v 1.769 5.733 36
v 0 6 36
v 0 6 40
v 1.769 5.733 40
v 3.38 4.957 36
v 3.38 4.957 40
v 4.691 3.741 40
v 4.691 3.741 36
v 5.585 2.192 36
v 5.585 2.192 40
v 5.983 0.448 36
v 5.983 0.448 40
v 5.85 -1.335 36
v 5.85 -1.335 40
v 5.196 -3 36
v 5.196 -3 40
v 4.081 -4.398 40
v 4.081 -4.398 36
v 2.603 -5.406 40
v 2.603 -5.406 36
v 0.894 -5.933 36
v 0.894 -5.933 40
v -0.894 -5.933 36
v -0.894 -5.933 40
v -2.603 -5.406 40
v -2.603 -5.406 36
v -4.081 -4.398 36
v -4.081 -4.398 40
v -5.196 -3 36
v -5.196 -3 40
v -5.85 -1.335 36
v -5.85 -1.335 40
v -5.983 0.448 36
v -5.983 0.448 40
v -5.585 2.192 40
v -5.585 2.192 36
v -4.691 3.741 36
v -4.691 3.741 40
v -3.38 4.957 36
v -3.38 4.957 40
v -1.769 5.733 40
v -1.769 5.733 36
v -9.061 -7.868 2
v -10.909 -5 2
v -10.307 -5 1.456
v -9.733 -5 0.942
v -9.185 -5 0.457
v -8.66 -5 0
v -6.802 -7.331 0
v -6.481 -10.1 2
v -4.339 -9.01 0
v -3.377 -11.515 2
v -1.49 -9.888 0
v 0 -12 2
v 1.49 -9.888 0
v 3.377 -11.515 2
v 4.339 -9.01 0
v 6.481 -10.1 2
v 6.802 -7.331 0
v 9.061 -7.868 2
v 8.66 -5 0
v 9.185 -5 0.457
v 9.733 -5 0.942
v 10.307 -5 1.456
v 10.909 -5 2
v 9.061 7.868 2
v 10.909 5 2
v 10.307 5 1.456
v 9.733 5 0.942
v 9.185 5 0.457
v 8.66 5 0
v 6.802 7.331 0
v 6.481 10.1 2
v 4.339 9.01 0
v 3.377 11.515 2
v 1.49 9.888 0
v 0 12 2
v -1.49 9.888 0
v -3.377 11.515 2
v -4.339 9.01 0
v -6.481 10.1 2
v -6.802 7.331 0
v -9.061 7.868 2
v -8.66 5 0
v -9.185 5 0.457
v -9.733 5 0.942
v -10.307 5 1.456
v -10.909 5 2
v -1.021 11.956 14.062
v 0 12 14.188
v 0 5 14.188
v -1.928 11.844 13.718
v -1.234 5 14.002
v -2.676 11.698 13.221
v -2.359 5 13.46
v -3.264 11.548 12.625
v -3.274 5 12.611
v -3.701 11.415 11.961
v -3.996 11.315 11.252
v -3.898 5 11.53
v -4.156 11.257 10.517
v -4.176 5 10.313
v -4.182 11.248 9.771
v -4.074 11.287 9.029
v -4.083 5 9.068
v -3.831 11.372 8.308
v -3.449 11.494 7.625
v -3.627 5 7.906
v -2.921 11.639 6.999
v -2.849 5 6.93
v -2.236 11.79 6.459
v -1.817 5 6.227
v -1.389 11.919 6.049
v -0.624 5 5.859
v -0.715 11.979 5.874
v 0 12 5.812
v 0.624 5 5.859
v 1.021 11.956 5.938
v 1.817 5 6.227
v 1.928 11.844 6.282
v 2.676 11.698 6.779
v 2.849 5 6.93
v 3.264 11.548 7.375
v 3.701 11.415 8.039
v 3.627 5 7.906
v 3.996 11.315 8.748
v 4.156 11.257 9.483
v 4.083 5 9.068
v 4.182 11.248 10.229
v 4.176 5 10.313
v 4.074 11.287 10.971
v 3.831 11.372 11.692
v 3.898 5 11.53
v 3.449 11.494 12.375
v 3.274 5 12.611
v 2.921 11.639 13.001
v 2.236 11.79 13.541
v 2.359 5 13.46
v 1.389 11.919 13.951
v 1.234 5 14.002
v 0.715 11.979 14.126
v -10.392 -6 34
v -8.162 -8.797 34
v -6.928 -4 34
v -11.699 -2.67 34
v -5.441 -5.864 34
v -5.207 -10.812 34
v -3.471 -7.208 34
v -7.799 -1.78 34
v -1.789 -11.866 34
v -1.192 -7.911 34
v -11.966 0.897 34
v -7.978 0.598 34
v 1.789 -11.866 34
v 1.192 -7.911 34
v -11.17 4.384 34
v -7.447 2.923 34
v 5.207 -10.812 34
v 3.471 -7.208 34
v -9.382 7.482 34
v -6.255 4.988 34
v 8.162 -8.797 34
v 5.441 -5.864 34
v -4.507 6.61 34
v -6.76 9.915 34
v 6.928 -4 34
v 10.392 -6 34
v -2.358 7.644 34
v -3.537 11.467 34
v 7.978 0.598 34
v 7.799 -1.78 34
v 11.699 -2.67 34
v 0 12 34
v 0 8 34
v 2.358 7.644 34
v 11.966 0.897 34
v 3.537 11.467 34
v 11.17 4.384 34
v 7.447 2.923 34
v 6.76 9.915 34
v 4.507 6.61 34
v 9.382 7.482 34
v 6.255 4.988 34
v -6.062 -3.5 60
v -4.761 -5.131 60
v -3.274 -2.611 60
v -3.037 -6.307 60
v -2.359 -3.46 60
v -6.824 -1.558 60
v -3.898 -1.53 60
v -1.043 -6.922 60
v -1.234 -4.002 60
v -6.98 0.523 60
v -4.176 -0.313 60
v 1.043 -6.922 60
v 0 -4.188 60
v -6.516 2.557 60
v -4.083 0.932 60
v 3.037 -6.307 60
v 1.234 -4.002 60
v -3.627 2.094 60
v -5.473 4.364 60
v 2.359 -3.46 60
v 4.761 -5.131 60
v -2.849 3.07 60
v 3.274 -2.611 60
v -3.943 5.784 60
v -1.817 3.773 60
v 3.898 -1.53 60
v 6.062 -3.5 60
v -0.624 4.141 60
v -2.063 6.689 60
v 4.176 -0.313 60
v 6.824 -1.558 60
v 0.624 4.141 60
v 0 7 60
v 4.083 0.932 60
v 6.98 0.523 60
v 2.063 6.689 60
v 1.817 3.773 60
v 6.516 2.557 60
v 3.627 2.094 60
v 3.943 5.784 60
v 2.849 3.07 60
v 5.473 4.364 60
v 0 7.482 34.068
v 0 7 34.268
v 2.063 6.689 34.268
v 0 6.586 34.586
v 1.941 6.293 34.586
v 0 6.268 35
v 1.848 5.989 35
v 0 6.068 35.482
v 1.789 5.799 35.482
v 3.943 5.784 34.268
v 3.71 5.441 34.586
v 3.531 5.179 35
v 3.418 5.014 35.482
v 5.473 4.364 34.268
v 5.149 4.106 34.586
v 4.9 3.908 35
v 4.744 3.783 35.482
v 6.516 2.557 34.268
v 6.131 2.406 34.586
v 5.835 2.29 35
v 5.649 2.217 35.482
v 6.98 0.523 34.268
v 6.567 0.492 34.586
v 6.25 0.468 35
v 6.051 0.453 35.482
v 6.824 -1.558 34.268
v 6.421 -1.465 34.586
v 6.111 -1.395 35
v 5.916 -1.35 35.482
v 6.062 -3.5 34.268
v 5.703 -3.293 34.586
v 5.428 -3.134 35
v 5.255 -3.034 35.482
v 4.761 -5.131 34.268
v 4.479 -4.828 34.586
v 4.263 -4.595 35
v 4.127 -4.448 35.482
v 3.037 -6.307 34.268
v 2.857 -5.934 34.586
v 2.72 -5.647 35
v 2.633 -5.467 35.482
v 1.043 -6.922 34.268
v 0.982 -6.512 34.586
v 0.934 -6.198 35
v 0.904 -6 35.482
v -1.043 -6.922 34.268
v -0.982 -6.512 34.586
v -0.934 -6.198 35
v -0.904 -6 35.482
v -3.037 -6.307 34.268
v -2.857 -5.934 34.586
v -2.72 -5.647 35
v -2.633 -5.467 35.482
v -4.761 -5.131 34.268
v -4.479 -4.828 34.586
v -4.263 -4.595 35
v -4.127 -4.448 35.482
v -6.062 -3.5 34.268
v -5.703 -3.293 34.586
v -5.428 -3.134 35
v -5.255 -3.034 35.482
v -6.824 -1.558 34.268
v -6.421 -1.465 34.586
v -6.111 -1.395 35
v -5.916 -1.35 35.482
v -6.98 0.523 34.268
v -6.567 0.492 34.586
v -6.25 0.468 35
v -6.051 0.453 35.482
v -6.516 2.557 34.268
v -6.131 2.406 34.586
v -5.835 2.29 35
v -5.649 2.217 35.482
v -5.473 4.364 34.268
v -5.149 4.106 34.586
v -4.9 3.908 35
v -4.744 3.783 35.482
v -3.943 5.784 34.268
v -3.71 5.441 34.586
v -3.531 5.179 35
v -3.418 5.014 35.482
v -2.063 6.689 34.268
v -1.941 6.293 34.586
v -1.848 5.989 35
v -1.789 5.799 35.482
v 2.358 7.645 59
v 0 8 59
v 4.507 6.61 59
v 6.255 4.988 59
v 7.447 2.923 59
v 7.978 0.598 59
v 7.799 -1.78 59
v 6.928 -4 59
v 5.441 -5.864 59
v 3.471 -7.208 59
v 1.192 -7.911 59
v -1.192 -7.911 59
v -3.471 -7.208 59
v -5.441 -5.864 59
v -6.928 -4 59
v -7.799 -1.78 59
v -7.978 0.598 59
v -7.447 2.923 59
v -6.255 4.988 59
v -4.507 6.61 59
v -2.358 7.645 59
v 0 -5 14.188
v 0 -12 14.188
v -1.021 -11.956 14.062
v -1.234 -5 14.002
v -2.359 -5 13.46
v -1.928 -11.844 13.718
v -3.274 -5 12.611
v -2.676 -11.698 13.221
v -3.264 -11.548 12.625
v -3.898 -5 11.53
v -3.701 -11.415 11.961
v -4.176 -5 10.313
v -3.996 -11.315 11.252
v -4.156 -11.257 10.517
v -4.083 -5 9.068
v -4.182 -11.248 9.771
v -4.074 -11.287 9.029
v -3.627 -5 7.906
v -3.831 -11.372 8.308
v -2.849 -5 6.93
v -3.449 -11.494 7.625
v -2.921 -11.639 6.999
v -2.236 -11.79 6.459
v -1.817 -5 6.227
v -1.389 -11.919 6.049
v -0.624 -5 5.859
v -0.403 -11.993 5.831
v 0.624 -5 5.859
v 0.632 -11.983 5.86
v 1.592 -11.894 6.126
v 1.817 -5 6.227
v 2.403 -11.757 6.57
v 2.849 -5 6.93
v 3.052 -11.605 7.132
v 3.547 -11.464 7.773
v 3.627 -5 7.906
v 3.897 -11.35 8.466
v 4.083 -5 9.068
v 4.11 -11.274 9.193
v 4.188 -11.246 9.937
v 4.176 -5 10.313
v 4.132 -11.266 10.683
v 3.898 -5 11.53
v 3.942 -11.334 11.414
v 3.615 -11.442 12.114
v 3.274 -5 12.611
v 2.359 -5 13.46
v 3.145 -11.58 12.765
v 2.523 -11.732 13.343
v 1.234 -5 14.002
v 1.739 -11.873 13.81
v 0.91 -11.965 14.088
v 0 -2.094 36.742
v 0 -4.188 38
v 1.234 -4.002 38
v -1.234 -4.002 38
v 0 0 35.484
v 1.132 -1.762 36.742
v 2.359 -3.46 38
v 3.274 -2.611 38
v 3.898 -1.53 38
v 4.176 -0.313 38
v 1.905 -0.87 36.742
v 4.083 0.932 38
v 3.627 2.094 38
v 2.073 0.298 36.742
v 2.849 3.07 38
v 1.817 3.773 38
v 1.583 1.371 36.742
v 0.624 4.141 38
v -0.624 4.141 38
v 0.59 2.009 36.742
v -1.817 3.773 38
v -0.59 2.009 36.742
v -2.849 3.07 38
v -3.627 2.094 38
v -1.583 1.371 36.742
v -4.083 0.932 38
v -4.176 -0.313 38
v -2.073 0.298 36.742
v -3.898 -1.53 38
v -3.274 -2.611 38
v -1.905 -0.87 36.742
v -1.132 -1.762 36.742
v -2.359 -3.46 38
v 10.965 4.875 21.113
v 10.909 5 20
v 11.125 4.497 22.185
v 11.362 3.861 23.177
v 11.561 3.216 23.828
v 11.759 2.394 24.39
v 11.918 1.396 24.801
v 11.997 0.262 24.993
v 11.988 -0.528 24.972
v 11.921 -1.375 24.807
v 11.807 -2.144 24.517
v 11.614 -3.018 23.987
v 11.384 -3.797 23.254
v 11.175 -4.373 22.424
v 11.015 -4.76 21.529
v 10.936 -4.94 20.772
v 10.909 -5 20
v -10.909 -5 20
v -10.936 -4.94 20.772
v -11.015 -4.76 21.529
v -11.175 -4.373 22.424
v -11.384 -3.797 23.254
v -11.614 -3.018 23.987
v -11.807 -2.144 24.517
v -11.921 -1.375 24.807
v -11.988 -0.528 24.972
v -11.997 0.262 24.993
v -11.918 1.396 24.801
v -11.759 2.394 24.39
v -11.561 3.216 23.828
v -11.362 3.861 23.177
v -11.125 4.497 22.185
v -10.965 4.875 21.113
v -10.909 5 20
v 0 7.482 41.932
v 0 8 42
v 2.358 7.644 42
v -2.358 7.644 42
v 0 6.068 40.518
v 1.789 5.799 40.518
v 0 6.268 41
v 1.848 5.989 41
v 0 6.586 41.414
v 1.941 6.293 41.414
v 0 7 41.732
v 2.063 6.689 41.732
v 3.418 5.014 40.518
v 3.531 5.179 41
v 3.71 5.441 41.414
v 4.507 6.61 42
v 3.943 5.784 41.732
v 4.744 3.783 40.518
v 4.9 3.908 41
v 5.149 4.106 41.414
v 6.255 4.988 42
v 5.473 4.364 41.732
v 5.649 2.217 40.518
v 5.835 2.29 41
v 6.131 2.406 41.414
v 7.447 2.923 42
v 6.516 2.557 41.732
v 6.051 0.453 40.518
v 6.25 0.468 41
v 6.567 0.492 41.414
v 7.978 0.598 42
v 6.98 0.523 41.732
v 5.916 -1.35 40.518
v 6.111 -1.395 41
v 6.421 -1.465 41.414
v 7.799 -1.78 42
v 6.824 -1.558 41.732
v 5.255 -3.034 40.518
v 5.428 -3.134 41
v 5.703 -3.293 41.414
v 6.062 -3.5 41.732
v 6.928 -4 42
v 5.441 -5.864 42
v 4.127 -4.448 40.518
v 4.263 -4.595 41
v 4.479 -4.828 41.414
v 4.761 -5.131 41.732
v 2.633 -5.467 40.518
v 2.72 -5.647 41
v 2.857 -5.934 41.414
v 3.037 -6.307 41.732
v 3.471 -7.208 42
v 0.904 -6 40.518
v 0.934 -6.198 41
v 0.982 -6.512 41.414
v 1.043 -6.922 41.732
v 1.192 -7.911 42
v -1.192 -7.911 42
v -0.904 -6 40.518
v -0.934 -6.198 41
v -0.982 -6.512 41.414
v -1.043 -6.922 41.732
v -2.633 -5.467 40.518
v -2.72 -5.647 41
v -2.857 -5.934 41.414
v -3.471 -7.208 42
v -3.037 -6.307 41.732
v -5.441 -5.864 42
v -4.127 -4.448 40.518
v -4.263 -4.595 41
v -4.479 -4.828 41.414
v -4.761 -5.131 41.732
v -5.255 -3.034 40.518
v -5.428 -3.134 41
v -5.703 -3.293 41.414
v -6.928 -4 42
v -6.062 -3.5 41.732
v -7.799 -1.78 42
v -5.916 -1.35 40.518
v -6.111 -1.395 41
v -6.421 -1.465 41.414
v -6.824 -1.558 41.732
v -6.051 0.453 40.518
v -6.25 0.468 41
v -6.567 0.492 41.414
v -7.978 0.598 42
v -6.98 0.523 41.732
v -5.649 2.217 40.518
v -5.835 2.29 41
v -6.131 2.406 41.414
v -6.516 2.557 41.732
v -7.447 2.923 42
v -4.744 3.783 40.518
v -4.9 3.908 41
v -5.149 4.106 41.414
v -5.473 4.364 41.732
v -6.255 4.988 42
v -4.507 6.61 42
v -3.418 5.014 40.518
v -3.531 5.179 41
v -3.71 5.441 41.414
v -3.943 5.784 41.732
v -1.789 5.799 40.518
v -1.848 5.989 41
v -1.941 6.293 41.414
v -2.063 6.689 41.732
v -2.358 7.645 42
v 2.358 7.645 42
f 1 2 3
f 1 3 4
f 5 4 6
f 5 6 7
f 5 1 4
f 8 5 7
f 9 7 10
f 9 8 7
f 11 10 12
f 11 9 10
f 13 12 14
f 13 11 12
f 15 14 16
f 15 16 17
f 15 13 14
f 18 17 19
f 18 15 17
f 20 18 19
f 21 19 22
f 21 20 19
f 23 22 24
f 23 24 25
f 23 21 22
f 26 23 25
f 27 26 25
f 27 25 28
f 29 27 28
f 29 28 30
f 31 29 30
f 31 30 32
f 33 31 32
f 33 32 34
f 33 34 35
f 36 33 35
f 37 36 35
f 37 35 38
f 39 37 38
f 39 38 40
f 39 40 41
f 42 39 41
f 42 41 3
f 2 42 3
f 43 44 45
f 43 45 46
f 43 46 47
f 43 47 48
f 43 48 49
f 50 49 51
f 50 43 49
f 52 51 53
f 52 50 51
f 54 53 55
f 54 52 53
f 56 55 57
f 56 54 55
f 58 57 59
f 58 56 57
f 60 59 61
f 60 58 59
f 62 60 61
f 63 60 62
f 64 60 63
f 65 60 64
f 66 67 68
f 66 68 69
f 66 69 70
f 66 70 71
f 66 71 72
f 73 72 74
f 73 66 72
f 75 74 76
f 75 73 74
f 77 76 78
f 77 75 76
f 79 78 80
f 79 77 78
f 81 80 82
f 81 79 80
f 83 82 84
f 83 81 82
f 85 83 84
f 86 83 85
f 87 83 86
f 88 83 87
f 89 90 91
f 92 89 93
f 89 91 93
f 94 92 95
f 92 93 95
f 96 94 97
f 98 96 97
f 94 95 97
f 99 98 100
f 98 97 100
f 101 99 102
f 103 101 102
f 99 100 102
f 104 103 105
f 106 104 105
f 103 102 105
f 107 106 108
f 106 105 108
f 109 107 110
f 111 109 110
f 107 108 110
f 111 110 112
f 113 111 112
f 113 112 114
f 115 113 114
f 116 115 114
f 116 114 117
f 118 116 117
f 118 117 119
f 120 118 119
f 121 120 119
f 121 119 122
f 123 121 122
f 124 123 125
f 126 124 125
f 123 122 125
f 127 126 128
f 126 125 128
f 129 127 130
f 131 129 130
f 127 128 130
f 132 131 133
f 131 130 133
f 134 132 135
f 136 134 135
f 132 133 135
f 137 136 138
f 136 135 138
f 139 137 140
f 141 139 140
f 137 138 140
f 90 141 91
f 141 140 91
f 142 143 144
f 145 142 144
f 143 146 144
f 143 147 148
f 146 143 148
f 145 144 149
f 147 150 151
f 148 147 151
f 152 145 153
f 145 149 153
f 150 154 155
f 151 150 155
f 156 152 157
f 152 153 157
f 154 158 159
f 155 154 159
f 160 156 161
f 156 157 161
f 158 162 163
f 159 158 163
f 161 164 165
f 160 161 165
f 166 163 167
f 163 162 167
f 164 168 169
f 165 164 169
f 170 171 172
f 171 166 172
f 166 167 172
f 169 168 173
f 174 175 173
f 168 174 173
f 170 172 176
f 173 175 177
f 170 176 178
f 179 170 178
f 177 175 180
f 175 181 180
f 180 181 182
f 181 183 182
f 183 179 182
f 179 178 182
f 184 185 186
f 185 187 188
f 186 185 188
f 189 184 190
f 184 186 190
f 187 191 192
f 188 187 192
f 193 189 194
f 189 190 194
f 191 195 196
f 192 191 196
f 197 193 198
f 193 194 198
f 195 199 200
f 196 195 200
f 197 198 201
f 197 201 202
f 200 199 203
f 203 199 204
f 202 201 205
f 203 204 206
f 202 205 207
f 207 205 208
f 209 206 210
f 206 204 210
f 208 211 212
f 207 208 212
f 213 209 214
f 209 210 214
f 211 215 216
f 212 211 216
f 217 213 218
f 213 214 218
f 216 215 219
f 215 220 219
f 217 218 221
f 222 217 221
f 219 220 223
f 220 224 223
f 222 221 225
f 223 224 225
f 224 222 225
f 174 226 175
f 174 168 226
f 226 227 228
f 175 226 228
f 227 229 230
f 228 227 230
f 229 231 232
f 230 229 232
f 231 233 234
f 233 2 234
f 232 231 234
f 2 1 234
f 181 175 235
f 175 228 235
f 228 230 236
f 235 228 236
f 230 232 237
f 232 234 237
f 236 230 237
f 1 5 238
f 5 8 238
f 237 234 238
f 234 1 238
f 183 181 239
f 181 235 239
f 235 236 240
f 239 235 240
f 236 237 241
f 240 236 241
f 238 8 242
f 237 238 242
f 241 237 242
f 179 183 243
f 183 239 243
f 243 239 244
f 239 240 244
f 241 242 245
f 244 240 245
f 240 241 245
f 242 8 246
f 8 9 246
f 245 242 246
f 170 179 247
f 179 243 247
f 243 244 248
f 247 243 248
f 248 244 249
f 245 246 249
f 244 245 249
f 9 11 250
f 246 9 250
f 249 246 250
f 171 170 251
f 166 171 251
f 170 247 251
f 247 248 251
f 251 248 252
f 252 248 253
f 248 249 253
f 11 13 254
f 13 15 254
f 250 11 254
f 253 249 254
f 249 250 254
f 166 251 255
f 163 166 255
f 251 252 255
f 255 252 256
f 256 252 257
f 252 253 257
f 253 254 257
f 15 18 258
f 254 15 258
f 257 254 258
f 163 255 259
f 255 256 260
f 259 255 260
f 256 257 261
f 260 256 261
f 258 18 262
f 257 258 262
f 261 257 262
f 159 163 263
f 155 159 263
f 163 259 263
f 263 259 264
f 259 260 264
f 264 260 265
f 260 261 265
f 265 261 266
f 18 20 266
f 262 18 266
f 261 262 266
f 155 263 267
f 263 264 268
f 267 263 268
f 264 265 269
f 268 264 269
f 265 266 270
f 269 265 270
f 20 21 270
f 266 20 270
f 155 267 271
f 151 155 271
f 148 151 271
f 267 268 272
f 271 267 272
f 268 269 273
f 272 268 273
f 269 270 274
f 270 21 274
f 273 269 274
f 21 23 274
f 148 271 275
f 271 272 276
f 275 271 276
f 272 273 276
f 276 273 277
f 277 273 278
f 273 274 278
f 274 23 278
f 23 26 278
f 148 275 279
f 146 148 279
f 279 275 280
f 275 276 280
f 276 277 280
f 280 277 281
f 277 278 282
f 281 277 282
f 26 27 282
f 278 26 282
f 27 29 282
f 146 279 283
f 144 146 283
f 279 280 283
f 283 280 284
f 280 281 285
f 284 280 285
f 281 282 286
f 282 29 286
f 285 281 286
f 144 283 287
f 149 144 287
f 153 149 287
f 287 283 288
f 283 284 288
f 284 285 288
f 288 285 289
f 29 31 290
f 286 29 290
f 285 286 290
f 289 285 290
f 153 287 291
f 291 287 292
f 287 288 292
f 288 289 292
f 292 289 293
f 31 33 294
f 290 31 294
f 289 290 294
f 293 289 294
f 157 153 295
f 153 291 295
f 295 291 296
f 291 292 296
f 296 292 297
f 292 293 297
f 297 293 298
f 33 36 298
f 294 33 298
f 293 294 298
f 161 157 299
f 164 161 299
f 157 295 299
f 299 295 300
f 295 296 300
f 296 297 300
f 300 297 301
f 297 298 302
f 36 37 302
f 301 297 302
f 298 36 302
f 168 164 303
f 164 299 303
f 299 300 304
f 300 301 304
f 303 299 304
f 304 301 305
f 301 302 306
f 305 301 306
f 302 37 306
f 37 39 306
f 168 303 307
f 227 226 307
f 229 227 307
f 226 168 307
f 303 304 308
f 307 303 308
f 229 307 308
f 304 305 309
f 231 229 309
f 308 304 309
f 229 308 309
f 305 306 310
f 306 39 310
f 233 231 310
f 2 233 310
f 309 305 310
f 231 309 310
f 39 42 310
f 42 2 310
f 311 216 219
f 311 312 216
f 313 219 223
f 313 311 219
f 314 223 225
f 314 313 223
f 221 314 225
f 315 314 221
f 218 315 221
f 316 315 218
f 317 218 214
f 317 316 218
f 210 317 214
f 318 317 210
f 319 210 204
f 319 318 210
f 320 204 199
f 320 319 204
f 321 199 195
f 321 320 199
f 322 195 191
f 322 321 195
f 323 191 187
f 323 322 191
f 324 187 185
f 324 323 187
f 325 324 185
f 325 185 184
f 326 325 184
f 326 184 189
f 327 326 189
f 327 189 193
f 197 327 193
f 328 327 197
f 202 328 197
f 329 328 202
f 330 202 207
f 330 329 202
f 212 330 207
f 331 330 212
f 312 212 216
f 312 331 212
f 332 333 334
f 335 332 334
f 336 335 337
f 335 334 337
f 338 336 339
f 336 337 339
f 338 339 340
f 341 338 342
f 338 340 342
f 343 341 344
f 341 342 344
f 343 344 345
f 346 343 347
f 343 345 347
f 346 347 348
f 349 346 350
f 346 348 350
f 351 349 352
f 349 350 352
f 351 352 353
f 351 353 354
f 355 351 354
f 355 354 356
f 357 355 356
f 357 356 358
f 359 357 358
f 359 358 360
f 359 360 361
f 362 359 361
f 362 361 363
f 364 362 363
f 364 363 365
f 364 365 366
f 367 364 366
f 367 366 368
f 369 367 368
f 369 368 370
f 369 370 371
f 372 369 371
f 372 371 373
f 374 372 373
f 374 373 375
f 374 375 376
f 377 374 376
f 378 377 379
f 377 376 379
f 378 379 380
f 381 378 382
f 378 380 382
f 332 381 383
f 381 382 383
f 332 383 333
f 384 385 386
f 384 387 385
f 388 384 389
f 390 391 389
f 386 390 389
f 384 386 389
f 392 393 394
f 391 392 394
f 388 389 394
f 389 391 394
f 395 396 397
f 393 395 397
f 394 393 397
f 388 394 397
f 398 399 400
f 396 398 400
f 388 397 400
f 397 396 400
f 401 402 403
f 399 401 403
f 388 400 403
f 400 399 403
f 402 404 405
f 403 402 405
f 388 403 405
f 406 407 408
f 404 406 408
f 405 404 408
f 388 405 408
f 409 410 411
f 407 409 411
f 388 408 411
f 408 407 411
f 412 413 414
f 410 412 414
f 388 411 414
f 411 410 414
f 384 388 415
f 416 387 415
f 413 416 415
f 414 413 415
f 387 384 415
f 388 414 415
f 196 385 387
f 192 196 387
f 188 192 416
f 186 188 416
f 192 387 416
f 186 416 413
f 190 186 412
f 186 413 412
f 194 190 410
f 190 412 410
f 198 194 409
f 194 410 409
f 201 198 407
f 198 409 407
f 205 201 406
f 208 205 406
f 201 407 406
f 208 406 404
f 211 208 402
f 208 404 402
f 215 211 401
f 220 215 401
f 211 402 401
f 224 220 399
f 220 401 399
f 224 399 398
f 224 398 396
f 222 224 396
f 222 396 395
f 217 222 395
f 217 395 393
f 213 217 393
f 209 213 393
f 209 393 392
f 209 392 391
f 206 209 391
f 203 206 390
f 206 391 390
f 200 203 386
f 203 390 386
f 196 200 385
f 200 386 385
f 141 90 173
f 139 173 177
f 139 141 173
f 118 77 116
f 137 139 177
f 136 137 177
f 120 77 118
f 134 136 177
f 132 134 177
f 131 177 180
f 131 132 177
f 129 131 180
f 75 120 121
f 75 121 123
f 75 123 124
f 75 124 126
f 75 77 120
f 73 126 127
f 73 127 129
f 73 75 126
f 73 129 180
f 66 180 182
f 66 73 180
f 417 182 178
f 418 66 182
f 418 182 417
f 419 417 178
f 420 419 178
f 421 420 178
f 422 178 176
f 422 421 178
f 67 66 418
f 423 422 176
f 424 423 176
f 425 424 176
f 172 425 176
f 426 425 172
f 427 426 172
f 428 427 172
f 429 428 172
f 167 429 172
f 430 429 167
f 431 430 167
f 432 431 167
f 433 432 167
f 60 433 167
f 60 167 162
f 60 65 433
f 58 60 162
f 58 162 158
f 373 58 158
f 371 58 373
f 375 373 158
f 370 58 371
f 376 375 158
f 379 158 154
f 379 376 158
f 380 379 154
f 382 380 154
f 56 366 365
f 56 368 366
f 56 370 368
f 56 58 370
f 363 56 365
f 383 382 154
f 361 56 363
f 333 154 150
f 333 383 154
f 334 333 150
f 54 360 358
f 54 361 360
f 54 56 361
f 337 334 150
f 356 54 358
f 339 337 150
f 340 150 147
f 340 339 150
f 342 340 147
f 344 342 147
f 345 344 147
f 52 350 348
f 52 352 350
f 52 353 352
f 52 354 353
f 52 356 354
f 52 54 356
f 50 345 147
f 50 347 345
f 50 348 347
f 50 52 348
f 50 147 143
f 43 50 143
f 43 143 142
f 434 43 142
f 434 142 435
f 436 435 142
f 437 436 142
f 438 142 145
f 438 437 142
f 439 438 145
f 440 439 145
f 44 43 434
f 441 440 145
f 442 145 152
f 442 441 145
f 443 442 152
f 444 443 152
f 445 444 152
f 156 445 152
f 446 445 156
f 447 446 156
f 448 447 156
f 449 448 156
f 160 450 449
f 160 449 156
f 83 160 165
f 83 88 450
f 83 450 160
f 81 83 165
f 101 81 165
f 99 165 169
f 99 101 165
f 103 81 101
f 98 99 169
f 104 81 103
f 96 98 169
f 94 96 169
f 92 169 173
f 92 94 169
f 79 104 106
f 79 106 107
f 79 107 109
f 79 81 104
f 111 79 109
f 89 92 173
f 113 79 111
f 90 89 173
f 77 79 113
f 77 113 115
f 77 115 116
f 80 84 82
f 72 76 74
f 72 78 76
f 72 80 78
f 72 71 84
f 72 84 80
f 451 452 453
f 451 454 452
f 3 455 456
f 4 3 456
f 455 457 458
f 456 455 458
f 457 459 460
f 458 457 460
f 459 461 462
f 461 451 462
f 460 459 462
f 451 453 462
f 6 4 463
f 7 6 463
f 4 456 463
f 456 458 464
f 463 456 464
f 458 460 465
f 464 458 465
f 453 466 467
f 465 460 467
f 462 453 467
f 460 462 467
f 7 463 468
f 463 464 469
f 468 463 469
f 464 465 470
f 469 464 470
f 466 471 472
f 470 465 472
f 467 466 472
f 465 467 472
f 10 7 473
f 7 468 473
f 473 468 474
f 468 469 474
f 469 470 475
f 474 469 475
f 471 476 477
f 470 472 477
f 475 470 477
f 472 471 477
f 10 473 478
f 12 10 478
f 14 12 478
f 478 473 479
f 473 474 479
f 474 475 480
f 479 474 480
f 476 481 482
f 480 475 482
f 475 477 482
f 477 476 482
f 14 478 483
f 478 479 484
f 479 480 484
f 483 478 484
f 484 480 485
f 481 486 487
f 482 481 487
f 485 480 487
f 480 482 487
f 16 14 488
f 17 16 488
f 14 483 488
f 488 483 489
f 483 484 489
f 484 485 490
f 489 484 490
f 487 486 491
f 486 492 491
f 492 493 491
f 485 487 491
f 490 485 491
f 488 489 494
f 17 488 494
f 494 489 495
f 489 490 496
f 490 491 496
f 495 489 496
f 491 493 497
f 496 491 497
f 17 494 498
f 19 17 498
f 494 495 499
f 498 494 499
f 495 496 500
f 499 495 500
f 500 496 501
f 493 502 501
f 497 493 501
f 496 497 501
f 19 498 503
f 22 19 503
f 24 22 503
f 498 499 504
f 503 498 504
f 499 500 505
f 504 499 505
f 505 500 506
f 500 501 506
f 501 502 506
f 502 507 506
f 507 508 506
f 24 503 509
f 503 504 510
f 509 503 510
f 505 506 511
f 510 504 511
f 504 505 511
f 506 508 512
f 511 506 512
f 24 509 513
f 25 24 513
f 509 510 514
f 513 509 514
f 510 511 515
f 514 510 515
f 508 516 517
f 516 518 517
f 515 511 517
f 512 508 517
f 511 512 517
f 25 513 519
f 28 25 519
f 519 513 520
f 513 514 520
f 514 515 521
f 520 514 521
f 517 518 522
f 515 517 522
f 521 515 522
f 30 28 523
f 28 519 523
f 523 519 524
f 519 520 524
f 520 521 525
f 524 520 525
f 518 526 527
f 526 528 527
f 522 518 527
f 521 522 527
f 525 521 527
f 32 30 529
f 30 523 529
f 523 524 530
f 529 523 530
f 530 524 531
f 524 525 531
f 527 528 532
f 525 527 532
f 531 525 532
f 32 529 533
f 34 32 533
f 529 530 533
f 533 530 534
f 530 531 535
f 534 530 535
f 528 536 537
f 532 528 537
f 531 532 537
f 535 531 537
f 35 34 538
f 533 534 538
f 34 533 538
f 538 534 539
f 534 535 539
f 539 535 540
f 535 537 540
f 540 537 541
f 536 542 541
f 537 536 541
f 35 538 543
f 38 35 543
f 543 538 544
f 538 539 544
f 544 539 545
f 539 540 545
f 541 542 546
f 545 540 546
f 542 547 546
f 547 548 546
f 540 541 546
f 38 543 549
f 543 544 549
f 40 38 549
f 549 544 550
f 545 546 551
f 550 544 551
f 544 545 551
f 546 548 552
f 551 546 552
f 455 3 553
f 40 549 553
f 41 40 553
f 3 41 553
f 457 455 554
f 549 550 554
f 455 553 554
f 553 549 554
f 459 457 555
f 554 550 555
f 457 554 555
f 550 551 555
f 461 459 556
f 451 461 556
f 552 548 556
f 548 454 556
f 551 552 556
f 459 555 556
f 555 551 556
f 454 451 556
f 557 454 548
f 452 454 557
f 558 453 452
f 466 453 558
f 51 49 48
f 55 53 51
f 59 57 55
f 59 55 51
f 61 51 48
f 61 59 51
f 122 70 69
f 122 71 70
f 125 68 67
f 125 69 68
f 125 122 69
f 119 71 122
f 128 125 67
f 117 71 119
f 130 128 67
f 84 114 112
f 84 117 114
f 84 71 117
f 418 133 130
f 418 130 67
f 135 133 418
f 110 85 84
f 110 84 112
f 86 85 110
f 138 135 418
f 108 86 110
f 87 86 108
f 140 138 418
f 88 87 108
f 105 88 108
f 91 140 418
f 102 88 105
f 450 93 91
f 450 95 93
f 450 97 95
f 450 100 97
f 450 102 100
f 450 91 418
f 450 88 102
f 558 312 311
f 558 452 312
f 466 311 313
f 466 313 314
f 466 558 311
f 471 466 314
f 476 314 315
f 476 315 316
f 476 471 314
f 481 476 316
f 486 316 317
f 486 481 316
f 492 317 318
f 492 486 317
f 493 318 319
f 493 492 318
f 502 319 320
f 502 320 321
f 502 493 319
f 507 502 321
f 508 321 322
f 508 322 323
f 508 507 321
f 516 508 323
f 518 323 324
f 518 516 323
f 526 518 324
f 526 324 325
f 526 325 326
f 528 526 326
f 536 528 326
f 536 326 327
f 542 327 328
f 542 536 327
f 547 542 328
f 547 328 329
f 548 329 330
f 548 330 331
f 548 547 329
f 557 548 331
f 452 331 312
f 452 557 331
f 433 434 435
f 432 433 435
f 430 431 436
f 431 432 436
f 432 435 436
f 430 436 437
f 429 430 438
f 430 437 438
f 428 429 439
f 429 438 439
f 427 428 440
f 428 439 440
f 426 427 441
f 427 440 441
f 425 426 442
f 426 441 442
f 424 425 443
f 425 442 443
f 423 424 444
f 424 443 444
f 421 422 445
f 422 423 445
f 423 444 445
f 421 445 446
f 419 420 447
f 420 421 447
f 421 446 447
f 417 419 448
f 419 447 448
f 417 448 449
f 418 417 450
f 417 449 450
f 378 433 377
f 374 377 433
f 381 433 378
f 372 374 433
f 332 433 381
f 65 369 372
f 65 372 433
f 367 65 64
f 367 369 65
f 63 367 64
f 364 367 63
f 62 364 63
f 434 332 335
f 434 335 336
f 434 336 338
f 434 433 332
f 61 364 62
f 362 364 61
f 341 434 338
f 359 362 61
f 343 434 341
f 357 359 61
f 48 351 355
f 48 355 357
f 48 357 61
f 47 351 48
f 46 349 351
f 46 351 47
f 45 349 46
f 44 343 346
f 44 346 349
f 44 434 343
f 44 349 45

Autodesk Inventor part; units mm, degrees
ref_plane "XZ Plane" through (0, 0, 0) normal (0, 1, 0) x (-1, 0, 0)
ref_plane "XY Plane" through (0, 0, 0) normal (0, 0, 1) x (1, 0, 0)
sketch "Sketch1" plane through (0, 0, 0) normal (1, 0, 0) x (0, 1, 0)
  line L0 (0, 67.4997) -> (0, -67.4997)
  line L1 (0, 60) -> (8, 60)
  line L2 (8, 60) -> (8, 42)
  line L3 (8, 42) -> (6, 42)
  line L4 (6, 42) -> (6, 34)
  line L5 (6, 34) -> (12, 34)
  line L6 (12, 34) -> (12, 0)
  line L7 (12, 0) -> (0, 0)
  dimension "d0" = 24
  dimension "d1" = 60
  dimension "d2" = 18
  dimension "d3" = 16
  dimension "d4" = 12
  dimension "d5" = 26
revolve "Revolution1" add sketch "Sketch1" angle 360 about axis through (0, 0, 67.4997) along (0, 0, -1)
chamfer "Chamfer1" distance 1 angle 45 1 edges at (0, -8, 60)
chamfer "Chamfer2" distance 2 angle 45 1 edges at (0, -12, 0)
fillet "Fillet1" radius 2 2 edges at (0, -6, 42) (0, -6, 34)
sketch "Sketch2" plane through (0, 0, 60) normal (0, 0, 1) x (1, 0, 0)
  circle A0 centre (0, 0) radius 7 projected
  point P0 (0, 0)
hole "Hole1" at (0, 0, 60) direction (0, 0, -1) diameter 8.376 depth 22 tip angle 118 thread size "M10x1.5" class "6H" standard "ISO Metric profile"
sketch "Sketch3" plane through (0, 0, 0) normal (1, 0, 0) x (0, 1, 0)
  line L0 (10, 0) -> (-10, 0) projected
  line L1 (5, 0) -> (5, 20)
  arc A0 (5, 20) -> (-5, 20) centre (0, 20) ccw
  line L2 (-5, 20) -> (-5, 0)
  line L3 (-5, 0) -> (5, 0)
  point P0 (0, 0)
  dimension "d21" = 10
  dimension "d22" = 20
extrude "Extrusion1" cut sketch "Sketch3" along normal through all both and the other way through all
hole "Hole3" at (0, 12, 10) direction (0, -1, 0) diameter 8.376 end through all thread size "M10x1.5" class "6H" standard "ISO Metric profile"
ref_plane "Work Plane2" through (0, 0, 10) normal (0, 0, -1) x (-1, 0, 0)
equation "\"d38\" = 0.5 * d5"
